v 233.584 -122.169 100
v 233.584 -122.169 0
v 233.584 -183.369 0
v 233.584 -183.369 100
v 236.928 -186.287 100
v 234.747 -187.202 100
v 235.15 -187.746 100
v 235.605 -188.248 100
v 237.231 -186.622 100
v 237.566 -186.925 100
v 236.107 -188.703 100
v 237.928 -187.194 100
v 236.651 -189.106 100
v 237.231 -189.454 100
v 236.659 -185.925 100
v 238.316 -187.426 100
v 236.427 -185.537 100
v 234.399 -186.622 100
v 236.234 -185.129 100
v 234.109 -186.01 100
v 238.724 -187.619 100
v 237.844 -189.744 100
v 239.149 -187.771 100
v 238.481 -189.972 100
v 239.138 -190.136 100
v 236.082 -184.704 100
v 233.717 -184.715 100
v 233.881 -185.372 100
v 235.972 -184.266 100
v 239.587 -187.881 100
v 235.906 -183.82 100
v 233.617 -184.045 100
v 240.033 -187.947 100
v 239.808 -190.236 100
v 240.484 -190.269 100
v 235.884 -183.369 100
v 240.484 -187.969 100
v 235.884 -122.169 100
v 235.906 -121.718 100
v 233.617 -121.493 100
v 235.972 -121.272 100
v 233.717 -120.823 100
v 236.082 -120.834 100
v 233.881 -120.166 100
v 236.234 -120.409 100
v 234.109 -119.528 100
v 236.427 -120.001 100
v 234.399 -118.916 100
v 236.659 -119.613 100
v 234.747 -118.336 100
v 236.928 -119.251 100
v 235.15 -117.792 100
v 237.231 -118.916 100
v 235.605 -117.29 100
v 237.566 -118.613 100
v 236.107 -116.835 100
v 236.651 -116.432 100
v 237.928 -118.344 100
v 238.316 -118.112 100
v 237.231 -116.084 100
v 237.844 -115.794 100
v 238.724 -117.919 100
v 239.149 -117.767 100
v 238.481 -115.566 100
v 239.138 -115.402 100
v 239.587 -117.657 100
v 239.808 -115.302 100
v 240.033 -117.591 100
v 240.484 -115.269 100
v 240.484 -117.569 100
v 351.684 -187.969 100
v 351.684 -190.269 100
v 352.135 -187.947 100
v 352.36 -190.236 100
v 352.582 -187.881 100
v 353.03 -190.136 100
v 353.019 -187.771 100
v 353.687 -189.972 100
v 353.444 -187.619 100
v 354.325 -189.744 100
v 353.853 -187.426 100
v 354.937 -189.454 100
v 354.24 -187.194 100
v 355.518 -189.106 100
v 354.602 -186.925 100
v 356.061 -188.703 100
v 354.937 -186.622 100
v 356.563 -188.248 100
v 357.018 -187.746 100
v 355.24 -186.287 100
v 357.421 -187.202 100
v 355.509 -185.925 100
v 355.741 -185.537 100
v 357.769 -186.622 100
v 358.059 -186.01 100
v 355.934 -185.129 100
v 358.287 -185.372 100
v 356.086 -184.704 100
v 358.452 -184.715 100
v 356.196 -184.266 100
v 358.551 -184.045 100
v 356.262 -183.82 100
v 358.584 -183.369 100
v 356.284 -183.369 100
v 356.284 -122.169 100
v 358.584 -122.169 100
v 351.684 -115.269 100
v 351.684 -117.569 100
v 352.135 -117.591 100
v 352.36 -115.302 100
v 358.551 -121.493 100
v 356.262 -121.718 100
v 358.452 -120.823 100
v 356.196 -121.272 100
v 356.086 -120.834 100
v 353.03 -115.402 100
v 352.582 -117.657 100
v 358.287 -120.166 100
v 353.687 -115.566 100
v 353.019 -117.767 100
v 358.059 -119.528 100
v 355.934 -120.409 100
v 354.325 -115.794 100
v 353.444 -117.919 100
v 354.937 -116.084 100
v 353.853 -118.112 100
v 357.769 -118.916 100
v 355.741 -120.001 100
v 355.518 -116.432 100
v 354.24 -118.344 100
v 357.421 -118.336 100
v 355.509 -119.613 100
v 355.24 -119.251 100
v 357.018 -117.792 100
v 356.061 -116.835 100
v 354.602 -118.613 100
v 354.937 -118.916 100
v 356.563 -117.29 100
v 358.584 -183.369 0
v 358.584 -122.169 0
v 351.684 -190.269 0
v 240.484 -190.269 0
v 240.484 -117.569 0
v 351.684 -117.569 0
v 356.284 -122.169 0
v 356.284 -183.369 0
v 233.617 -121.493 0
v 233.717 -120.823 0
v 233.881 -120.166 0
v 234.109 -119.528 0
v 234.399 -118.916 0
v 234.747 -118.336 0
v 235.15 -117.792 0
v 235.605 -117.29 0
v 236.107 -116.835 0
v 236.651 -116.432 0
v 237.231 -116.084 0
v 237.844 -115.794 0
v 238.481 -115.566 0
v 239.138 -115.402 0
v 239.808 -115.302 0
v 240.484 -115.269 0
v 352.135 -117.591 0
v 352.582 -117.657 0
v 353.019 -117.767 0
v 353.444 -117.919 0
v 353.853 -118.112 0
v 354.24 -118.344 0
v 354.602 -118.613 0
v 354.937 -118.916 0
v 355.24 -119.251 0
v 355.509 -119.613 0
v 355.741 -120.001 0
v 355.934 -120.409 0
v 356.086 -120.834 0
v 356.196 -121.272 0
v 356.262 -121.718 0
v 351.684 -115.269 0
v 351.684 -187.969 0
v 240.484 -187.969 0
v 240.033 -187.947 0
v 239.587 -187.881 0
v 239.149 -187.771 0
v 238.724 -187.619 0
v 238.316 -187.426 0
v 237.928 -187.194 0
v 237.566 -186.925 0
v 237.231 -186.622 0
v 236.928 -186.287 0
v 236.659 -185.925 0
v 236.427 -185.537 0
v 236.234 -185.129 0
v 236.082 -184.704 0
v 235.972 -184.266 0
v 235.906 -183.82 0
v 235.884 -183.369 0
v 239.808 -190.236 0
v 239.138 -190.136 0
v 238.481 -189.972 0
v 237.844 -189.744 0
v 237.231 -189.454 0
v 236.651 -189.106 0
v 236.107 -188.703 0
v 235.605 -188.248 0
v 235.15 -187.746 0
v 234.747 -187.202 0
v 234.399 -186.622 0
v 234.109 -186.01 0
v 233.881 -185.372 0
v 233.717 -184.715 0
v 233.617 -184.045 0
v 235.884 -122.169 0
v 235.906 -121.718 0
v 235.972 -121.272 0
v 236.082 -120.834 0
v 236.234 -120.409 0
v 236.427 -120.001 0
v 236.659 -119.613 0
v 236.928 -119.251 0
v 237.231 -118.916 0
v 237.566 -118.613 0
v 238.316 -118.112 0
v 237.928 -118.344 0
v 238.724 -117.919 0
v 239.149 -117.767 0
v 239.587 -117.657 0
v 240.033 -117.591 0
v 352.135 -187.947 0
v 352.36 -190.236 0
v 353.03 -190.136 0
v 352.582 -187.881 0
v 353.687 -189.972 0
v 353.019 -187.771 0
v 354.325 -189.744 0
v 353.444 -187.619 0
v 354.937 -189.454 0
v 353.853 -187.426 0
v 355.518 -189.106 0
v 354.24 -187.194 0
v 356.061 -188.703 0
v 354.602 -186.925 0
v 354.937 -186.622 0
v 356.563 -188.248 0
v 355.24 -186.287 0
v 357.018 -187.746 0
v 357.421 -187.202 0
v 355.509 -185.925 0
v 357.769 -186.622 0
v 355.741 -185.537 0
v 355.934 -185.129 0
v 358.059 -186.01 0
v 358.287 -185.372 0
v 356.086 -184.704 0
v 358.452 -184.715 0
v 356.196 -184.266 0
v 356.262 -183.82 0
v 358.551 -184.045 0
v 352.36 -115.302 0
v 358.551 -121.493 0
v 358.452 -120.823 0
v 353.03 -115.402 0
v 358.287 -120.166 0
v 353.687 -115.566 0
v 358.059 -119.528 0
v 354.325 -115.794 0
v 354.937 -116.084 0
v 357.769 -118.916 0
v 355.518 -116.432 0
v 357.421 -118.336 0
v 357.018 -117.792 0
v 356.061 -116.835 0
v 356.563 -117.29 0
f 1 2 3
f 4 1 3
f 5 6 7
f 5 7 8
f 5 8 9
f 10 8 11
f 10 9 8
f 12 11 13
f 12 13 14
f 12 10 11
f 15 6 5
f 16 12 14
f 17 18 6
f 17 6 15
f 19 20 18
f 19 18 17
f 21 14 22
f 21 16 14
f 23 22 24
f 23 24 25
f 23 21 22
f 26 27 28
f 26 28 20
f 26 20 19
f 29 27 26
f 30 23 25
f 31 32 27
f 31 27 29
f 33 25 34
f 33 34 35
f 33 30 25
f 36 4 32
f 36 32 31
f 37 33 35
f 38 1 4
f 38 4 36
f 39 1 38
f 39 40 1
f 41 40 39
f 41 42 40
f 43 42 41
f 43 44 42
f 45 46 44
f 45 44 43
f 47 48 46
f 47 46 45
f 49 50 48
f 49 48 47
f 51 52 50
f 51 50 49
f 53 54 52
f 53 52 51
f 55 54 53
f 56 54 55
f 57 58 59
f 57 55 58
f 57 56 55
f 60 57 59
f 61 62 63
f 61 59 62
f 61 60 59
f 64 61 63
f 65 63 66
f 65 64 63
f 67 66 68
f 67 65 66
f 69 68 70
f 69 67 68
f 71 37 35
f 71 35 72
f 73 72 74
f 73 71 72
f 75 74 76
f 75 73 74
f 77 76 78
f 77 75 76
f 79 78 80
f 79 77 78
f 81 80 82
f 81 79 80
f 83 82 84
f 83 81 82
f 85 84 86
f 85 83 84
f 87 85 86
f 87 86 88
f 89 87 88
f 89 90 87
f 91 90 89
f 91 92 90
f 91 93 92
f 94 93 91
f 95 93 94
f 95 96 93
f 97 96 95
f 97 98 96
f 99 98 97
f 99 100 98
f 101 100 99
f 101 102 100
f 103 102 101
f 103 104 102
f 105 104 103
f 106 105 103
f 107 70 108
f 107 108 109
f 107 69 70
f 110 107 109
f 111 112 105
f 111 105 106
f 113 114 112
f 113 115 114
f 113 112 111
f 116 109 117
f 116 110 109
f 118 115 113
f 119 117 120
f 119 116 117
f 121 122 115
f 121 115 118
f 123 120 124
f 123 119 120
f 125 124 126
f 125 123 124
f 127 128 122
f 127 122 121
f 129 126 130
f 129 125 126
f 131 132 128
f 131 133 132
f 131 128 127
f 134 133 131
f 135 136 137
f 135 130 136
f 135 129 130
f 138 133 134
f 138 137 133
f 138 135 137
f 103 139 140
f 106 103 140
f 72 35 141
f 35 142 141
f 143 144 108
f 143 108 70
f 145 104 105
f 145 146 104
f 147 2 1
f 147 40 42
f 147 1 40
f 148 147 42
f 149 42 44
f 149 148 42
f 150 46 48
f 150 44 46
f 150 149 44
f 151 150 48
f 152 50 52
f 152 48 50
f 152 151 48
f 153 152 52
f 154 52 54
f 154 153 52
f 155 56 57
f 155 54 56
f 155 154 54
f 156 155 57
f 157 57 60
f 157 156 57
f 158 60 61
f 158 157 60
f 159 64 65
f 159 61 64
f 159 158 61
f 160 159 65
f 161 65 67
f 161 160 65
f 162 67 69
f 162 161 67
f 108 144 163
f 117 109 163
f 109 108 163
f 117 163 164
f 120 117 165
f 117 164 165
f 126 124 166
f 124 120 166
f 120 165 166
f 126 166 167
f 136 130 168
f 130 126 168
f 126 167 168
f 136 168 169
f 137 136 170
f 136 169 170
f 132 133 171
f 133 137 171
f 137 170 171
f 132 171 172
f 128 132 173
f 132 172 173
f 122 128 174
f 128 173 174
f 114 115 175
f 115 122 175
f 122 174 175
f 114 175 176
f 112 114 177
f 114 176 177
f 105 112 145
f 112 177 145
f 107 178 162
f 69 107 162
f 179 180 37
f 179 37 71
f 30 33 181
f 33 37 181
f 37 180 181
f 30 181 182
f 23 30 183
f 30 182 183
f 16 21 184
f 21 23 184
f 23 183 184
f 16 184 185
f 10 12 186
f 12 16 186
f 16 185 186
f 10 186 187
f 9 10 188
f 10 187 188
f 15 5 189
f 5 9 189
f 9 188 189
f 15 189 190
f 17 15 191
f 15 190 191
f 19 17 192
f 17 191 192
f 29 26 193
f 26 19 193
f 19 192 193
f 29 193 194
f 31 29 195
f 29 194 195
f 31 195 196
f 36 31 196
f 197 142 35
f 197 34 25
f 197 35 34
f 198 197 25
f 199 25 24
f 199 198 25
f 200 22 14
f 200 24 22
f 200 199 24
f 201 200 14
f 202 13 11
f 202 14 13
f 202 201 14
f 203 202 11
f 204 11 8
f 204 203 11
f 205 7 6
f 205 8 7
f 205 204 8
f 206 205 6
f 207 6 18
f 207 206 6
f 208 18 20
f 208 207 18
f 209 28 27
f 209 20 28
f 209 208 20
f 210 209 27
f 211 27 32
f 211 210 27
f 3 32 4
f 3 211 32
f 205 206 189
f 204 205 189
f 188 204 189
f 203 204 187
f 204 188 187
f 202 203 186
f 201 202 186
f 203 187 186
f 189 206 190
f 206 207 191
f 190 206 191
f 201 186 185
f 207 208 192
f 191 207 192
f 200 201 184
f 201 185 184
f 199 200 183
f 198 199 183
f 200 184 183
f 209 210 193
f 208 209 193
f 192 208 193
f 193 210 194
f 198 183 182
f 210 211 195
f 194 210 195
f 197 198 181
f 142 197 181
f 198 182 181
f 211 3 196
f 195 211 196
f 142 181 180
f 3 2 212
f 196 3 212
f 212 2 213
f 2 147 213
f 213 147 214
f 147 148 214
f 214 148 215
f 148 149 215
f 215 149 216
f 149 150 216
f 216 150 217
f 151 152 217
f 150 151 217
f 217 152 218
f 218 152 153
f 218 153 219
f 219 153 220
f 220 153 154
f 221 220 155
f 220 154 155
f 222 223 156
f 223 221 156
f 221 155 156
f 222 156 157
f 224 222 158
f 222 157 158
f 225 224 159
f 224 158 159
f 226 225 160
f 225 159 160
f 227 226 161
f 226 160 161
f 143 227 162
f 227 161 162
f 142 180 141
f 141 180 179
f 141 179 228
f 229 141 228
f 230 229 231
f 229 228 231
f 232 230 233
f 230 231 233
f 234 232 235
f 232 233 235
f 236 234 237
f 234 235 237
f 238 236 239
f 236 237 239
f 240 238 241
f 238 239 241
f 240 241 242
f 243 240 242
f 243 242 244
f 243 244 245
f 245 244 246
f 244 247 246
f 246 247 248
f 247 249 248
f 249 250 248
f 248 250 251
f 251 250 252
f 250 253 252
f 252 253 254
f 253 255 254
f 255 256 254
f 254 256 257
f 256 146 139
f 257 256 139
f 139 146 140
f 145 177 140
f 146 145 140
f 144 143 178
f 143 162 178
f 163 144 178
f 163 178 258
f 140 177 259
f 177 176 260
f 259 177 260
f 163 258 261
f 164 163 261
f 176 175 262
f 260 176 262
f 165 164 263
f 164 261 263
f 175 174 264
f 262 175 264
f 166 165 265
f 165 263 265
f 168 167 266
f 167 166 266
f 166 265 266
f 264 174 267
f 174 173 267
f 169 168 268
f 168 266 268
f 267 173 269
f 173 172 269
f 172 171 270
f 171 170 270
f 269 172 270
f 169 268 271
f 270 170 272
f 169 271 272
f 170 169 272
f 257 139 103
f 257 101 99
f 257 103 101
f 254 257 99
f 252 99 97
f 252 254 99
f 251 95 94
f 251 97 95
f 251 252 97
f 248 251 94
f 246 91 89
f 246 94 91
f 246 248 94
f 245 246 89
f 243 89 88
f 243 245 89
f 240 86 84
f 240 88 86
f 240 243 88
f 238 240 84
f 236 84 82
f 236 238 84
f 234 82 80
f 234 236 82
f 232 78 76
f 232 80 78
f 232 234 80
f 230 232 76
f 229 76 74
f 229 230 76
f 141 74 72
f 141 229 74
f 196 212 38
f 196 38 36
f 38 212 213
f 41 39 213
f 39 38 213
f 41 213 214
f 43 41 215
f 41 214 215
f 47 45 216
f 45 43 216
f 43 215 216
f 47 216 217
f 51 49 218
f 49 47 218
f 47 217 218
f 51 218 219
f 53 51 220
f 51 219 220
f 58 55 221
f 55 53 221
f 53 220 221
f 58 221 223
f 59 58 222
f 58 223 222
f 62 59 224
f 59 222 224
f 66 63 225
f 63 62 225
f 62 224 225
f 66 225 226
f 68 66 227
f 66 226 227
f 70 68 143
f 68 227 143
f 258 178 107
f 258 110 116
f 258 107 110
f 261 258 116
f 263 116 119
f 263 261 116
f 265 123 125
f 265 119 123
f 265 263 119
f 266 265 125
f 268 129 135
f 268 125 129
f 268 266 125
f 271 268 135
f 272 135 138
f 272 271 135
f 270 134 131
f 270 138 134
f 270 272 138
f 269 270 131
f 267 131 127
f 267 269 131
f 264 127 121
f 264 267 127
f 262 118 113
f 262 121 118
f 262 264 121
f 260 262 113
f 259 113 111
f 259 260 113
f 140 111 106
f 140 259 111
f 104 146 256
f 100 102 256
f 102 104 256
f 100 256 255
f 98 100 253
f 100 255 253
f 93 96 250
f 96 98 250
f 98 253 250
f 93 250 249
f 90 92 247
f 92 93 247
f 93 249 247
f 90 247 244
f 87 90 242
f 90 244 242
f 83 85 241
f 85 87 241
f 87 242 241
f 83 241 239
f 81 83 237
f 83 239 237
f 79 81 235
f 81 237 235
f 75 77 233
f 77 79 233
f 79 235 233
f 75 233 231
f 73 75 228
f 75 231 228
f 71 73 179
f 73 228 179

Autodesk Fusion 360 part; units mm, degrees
sketch "スケッチ1" plane through (0, 0, 0) normal (0, 0, 1) x (1, 0, 0)
  line L0 (240.4841, -190.269) -> (351.6841, -190.269)
  line L1 (240.4841, -187.969) -> (351.6841, -187.969)
  line L2 (351.6841, -115.269) -> (240.4841, -115.269)
  line L3 (351.6841, -117.569) -> (240.4841, -117.569)
  arc A0 (233.5841, -183.369) -> (240.4841, -190.269) centre (240.4841, -183.369) ccw
  arc A1 (235.8841, -183.369) -> (240.4841, -187.969) centre (240.4841, -183.369) ccw
  arc A2 (240.4841, -115.269) -> (233.5841, -122.169) centre (240.4841, -122.169) ccw
  line L4 (233.5841, -122.169) -> (233.5841, -183.369)
  line L5 (235.8841, -122.169) -> (235.8841, -183.369)
  arc A3 (240.4841, -117.569) -> (235.8841, -122.169) centre (240.4841, -122.169) ccw
  arc A4 (351.6841, -190.269) -> (358.5841, -183.369) centre (351.6841, -183.369) ccw
  arc A5 (351.6841, -187.969) -> (356.2841, -183.369) centre (351.6841, -183.369) ccw
  line L6 (358.5841, -183.369) -> (358.5841, -122.169)
  line L7 (356.2841, -183.369) -> (356.2841, -122.169)
  arc A6 (358.5841, -122.169) -> (351.6841, -115.269) centre (351.6841, -122.169) ccw
  arc A7 (356.2841, -122.169) -> (351.6841, -117.569) centre (351.6841, -122.169) ccw
  point P0 (296.0841, -152.769)
extrude "押し出し1" add sketch "スケッチ1" along normal blind 100
